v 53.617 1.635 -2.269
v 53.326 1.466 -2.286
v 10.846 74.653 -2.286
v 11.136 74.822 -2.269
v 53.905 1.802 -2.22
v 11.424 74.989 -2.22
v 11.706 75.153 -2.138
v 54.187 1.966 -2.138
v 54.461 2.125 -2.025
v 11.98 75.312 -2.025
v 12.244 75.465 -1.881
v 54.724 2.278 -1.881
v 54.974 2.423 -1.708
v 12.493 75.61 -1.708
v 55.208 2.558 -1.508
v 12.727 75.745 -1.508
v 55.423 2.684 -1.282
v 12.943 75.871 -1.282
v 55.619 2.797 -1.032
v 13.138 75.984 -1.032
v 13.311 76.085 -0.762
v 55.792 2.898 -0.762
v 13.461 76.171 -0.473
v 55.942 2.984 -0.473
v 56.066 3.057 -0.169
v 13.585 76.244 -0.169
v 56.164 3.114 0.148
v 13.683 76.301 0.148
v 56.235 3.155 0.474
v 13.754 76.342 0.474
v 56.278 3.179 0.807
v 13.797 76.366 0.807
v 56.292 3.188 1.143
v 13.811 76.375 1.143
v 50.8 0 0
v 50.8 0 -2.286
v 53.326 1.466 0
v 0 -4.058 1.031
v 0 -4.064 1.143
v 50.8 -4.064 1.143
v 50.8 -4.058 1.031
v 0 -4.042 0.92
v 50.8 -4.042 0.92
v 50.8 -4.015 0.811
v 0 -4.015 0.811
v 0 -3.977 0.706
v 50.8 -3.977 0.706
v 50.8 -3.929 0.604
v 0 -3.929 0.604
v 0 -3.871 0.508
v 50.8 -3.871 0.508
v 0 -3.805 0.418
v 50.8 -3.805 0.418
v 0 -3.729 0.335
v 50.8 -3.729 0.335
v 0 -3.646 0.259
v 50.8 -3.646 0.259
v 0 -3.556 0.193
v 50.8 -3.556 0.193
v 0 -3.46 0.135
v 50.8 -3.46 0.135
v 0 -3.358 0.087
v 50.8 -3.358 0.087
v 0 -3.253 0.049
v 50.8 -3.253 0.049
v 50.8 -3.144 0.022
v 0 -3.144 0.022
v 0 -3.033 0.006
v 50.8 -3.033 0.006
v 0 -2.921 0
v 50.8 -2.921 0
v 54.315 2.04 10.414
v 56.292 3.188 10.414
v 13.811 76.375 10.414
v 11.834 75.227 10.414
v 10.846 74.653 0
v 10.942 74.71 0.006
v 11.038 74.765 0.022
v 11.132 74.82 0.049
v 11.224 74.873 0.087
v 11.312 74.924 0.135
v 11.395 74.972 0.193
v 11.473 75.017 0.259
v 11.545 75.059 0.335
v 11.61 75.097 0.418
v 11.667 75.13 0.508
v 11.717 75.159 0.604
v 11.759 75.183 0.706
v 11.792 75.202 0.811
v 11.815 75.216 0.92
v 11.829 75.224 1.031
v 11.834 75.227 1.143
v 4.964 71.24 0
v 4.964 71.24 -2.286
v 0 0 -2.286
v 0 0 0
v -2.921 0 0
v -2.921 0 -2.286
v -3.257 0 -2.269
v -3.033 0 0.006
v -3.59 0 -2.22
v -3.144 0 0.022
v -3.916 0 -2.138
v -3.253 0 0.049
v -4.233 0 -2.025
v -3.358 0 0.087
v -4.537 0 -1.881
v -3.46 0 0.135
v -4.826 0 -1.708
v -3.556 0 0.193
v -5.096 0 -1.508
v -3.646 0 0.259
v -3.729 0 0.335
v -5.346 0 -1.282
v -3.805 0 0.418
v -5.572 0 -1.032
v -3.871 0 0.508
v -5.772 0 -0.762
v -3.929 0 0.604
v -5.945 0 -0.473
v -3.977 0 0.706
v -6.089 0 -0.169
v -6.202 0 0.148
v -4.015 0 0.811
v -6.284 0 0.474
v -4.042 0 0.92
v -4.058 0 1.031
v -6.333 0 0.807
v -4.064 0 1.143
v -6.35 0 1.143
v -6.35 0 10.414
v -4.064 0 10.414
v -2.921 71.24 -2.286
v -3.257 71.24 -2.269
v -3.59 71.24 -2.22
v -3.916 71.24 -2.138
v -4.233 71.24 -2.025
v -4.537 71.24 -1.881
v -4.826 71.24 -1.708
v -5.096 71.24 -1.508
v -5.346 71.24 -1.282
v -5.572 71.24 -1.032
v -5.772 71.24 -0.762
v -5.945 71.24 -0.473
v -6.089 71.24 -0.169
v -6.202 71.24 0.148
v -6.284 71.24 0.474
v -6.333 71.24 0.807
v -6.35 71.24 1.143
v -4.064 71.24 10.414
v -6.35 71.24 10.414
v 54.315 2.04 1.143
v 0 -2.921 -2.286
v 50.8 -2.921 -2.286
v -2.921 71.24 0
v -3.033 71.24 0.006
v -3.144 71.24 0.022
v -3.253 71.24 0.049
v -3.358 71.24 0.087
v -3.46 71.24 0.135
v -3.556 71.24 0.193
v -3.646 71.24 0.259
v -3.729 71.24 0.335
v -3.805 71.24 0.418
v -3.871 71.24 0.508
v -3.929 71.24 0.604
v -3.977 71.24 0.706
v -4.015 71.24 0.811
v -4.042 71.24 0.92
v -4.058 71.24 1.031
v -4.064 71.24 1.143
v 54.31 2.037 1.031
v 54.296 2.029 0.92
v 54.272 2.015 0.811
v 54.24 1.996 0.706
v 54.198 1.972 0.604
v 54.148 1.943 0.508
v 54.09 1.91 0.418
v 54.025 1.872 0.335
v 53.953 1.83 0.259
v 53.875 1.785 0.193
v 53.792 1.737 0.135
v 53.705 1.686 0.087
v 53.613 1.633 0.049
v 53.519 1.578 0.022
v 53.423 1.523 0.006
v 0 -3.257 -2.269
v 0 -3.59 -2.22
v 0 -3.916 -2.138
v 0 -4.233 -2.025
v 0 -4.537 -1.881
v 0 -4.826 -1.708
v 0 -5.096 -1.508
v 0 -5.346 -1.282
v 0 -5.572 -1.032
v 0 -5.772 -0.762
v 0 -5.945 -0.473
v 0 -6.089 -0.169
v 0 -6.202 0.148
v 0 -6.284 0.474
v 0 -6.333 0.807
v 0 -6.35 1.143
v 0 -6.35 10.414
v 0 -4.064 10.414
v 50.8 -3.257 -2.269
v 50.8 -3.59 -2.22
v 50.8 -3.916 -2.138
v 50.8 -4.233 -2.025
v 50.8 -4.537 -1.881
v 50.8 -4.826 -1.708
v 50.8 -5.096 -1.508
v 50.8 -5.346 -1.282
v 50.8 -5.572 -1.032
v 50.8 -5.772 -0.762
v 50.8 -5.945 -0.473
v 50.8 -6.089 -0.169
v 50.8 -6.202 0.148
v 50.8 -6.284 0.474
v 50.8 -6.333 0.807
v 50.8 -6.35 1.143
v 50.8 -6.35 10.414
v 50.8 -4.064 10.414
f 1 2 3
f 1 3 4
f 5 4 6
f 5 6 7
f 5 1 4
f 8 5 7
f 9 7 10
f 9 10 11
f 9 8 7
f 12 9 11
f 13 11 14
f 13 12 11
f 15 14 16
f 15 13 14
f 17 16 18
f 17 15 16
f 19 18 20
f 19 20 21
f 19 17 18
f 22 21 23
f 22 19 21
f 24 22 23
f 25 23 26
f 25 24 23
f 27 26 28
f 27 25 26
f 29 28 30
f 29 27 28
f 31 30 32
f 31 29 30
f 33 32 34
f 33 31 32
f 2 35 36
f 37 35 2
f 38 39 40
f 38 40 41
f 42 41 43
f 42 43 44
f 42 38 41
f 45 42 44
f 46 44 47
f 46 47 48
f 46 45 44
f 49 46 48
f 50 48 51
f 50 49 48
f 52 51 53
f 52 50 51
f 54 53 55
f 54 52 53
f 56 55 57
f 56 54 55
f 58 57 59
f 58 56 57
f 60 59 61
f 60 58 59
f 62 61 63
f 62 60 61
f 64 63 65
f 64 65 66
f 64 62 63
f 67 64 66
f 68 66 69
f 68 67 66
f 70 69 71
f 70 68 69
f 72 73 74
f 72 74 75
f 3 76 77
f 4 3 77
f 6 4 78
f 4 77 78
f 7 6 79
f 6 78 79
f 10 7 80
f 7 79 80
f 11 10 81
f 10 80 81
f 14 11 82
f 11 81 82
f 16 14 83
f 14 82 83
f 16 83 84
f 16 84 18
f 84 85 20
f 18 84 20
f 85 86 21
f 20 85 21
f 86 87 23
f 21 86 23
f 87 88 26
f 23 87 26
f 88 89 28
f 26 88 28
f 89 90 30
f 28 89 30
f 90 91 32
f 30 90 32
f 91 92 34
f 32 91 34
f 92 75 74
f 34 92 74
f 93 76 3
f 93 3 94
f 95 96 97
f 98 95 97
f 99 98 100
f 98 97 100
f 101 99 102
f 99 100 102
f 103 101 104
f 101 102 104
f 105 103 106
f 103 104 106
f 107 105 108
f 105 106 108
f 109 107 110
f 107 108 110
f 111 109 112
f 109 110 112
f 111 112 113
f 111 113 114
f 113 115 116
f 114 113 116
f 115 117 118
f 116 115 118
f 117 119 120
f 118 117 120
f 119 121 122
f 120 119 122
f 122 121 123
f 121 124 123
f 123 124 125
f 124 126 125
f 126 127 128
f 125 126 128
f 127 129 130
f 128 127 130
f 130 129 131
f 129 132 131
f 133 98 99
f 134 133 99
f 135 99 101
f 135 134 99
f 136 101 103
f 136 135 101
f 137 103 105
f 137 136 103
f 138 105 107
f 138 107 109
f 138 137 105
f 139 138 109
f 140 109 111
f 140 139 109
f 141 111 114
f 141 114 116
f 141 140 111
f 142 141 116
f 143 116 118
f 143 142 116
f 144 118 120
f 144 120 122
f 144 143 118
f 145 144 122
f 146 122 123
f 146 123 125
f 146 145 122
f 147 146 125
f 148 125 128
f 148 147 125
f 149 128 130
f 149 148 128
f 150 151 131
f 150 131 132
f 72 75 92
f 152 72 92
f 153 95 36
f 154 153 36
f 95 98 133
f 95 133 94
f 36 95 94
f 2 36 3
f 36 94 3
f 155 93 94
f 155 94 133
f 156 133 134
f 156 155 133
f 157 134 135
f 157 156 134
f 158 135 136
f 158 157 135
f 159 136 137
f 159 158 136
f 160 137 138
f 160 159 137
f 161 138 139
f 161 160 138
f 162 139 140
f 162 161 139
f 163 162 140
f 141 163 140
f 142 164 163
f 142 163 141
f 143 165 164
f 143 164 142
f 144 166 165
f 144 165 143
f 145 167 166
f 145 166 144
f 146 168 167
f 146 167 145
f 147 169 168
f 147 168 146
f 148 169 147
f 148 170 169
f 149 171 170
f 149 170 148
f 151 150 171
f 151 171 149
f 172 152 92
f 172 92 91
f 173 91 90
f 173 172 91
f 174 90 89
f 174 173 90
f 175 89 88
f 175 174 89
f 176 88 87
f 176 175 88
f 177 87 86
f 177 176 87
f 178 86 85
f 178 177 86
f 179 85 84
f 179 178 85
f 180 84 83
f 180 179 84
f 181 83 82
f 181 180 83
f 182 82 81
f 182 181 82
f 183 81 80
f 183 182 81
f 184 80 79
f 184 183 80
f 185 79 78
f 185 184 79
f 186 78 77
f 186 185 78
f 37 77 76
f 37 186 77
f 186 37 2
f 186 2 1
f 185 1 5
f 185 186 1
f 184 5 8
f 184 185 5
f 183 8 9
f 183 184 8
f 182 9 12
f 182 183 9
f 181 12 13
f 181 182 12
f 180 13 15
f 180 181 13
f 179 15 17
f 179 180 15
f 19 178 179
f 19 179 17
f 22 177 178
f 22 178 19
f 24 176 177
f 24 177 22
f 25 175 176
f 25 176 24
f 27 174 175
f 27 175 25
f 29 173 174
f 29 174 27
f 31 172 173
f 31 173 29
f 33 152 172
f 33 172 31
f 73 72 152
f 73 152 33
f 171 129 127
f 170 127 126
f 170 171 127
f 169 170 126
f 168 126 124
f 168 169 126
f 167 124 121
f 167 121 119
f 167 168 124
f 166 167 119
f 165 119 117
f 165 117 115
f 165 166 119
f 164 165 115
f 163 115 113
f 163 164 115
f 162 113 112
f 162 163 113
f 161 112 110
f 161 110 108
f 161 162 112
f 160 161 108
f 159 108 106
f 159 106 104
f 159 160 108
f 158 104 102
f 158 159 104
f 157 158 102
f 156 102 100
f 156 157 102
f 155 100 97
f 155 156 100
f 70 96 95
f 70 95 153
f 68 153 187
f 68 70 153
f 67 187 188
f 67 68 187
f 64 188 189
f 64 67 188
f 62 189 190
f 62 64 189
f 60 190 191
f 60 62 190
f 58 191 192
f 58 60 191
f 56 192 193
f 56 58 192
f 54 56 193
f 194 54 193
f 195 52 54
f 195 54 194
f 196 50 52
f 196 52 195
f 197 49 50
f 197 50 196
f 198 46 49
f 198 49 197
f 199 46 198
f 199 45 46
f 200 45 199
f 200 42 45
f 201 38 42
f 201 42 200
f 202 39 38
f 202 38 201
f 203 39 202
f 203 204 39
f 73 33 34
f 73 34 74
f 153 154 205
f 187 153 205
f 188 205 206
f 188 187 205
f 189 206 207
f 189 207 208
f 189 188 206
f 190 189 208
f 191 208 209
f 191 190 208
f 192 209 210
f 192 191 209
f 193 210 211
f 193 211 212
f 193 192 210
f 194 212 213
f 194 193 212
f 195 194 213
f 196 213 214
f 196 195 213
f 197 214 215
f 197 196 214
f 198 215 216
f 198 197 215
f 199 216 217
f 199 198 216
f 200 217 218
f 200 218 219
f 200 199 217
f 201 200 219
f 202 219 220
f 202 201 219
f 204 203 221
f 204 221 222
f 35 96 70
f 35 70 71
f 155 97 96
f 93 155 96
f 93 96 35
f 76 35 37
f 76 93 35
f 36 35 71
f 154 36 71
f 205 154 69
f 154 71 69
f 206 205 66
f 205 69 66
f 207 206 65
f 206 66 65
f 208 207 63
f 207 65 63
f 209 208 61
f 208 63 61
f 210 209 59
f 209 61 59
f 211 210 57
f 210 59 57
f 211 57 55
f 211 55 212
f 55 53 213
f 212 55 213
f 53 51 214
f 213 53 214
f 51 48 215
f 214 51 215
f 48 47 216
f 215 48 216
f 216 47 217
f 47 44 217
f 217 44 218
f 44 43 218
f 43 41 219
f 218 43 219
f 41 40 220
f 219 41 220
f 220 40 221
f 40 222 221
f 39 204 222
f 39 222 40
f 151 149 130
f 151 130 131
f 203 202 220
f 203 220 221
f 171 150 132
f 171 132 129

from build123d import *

# Parameters (mm, degrees)
BASE_FLANGE1_DEPTH             = 2.286
EDGE_FLANGE1_STRIP_W           = 11.43
EDGE_FLANGE1_STRIP_H           = 2.286
EDGE_FLANGE1_STRIP_CUT_DEPTH   = 71.239731207
EDGE_FLANGE1_STRIP_2_W         = 11.43
EDGE_FLANGE1_STRIP_2_H         = 2.286
EDGE_FLANGE1_STRIP_CUT_2_DEPTH = 50.8
EDGE_FLANGE1_STRIP_3_W         = 11.43
EDGE_FLANGE1_STRIP_3_H         = 2.286
EDGE_FLANGE1_STRIP_CUT_3_DEPTH = 84.622425054
EDGE_FLANGE1_DEPTH             = 71.239731207
EDGE_FLANGE1_BEND_DEPTH        = 50.8
EDGE_FLANGE1_BEND_2_DEPTH      = 84.622425054


# Sheet-metal steps are written as plain solids
with BuildPart() as part:
    # Sketch1 → Base-Flange1 (new body)
    with BuildSketch(Plane.XY):
        Polygon((0, 0), (0, -6.35), (50.8, -6.35), (50.8, 0), (56.291897179, 3.187721032), (13.811159523, 76.374753696), (4.964395568, 71.239731207), (-6.35, 71.239731207), (-6.35, 0), align=None)
    extrude(amount=-BASE_FLANGE1_DEPTH)

    # Edge-Flange1 strip (across the edge) → Edge-Flange1 strip cut (cut)
    with BuildSketch(Plane(origin=(-6.35, 71.239731207, 0), x_dir=(1, 0, 0), z_dir=(0, -1, 0))):
        with Locations((-2.286, -1.143)):
            Rectangle(EDGE_FLANGE1_STRIP_W, EDGE_FLANGE1_STRIP_H)
    extrude(amount=EDGE_FLANGE1_STRIP_CUT_DEPTH, mode=Mode.SUBTRACT)

    # Edge-Flange1 strip 2 (across the edge) → Edge-Flange1 strip cut 2 (cut)
    with BuildSketch(Plane(origin=(0, -6.35, 0), x_dir=(0, 1, 0), z_dir=(1, 0, 0))):
        with Locations((-2.286, -1.143)):
            Rectangle(EDGE_FLANGE1_STRIP_2_W, EDGE_FLANGE1_STRIP_2_H)
    extrude(amount=EDGE_FLANGE1_STRIP_CUT_2_DEPTH, mode=Mode.SUBTRACT)

    # Edge-Flange1 strip 3 (across the edge) → Edge-Flange1 strip cut 3 (cut)
    with BuildSketch(Plane(origin=(56.291897179, 3.187721032, 0), x_dir=(-0.8648656974537777, -0.5020033121083872, 3.491481338843133e-15), z_dir=(-0.5020033121083872, 0.8648656974537777, 0))):
        with Locations((-2.286, -1.143)):
            Rectangle(EDGE_FLANGE1_STRIP_3_W, EDGE_FLANGE1_STRIP_3_H)
    extrude(amount=EDGE_FLANGE1_STRIP_CUT_3_DEPTH, mode=Mode.SUBTRACT)

    # Edge-Flange1 section (across the edge) → Edge-Flange1 (add)
    with BuildSketch(Plane(origin=(-6.35, 71.239731207, 0), x_dir=(1, 0, 0), z_dir=(0, -1, 0))):
        with BuildLine():
            Line((0, 1.143), (0, 10.414))
            Line((0, 10.414), (2.286, 10.414))
            Line((2.286, 10.414), (2.286, 1.143))
            ThreePointArc((2.286, 1.143), (2.620776949, 0.334776949), (3.429, 0))
            Line((3.429, 0), (3.429, -2.286))
            ThreePointArc((3.429, -2.286), (1.004330847, -1.281669153), (0, 1.143))
        make_face()
    extrude(amount=EDGE_FLANGE1_DEPTH)

    # Edge-Flange1 section 2 (across the edge) → Edge-Flange1 bend (add)
    with BuildSketch(Plane(origin=(0, -6.35, 0), x_dir=(0, 1, 0), z_dir=(1, 0, 0))):
        with BuildLine():
            Line((0, 1.143), (0, 10.414))
            Line((0, 10.414), (2.286, 10.414))
            Line((2.286, 10.414), (2.286, 1.143))
            ThreePointArc((2.286, 1.143), (2.620776949, 0.334776949), (3.429, 0))
            Line((3.429, 0), (3.429, -2.286))
            ThreePointArc((3.429, -2.286), (1.004330847, -1.281669153), (0, 1.143))
        make_face()
    extrude(amount=EDGE_FLANGE1_BEND_DEPTH)

    # Edge-Flange1 section 3 (across the edge) → Edge-Flange1 bend 2 (add)
    with BuildSketch(Plane(origin=(56.291897179, 3.187721032, 0), x_dir=(-0.8648656974537777, -0.5020033121083872, 3.491481338843133e-15), z_dir=(-0.5020033121083872, 0.8648656974537777, 0))):
        with BuildLine():
            Line((0, 1.143), (0, 10.414))
            Line((0, 10.414), (2.286, 10.414))
            Line((2.286, 10.414), (2.286, 1.143))
            ThreePointArc((2.286, 1.143), (2.620776949, 0.334776949), (3.429, 0))
            Line((3.429, 0), (3.429, -2.286))
            ThreePointArc((3.429, -2.286), (1.004330847, -1.281669153), (0, 1.143))
        make_face()
    extrude(amount=EDGE_FLANGE1_BEND_2_DEPTH)


solid = part.part
